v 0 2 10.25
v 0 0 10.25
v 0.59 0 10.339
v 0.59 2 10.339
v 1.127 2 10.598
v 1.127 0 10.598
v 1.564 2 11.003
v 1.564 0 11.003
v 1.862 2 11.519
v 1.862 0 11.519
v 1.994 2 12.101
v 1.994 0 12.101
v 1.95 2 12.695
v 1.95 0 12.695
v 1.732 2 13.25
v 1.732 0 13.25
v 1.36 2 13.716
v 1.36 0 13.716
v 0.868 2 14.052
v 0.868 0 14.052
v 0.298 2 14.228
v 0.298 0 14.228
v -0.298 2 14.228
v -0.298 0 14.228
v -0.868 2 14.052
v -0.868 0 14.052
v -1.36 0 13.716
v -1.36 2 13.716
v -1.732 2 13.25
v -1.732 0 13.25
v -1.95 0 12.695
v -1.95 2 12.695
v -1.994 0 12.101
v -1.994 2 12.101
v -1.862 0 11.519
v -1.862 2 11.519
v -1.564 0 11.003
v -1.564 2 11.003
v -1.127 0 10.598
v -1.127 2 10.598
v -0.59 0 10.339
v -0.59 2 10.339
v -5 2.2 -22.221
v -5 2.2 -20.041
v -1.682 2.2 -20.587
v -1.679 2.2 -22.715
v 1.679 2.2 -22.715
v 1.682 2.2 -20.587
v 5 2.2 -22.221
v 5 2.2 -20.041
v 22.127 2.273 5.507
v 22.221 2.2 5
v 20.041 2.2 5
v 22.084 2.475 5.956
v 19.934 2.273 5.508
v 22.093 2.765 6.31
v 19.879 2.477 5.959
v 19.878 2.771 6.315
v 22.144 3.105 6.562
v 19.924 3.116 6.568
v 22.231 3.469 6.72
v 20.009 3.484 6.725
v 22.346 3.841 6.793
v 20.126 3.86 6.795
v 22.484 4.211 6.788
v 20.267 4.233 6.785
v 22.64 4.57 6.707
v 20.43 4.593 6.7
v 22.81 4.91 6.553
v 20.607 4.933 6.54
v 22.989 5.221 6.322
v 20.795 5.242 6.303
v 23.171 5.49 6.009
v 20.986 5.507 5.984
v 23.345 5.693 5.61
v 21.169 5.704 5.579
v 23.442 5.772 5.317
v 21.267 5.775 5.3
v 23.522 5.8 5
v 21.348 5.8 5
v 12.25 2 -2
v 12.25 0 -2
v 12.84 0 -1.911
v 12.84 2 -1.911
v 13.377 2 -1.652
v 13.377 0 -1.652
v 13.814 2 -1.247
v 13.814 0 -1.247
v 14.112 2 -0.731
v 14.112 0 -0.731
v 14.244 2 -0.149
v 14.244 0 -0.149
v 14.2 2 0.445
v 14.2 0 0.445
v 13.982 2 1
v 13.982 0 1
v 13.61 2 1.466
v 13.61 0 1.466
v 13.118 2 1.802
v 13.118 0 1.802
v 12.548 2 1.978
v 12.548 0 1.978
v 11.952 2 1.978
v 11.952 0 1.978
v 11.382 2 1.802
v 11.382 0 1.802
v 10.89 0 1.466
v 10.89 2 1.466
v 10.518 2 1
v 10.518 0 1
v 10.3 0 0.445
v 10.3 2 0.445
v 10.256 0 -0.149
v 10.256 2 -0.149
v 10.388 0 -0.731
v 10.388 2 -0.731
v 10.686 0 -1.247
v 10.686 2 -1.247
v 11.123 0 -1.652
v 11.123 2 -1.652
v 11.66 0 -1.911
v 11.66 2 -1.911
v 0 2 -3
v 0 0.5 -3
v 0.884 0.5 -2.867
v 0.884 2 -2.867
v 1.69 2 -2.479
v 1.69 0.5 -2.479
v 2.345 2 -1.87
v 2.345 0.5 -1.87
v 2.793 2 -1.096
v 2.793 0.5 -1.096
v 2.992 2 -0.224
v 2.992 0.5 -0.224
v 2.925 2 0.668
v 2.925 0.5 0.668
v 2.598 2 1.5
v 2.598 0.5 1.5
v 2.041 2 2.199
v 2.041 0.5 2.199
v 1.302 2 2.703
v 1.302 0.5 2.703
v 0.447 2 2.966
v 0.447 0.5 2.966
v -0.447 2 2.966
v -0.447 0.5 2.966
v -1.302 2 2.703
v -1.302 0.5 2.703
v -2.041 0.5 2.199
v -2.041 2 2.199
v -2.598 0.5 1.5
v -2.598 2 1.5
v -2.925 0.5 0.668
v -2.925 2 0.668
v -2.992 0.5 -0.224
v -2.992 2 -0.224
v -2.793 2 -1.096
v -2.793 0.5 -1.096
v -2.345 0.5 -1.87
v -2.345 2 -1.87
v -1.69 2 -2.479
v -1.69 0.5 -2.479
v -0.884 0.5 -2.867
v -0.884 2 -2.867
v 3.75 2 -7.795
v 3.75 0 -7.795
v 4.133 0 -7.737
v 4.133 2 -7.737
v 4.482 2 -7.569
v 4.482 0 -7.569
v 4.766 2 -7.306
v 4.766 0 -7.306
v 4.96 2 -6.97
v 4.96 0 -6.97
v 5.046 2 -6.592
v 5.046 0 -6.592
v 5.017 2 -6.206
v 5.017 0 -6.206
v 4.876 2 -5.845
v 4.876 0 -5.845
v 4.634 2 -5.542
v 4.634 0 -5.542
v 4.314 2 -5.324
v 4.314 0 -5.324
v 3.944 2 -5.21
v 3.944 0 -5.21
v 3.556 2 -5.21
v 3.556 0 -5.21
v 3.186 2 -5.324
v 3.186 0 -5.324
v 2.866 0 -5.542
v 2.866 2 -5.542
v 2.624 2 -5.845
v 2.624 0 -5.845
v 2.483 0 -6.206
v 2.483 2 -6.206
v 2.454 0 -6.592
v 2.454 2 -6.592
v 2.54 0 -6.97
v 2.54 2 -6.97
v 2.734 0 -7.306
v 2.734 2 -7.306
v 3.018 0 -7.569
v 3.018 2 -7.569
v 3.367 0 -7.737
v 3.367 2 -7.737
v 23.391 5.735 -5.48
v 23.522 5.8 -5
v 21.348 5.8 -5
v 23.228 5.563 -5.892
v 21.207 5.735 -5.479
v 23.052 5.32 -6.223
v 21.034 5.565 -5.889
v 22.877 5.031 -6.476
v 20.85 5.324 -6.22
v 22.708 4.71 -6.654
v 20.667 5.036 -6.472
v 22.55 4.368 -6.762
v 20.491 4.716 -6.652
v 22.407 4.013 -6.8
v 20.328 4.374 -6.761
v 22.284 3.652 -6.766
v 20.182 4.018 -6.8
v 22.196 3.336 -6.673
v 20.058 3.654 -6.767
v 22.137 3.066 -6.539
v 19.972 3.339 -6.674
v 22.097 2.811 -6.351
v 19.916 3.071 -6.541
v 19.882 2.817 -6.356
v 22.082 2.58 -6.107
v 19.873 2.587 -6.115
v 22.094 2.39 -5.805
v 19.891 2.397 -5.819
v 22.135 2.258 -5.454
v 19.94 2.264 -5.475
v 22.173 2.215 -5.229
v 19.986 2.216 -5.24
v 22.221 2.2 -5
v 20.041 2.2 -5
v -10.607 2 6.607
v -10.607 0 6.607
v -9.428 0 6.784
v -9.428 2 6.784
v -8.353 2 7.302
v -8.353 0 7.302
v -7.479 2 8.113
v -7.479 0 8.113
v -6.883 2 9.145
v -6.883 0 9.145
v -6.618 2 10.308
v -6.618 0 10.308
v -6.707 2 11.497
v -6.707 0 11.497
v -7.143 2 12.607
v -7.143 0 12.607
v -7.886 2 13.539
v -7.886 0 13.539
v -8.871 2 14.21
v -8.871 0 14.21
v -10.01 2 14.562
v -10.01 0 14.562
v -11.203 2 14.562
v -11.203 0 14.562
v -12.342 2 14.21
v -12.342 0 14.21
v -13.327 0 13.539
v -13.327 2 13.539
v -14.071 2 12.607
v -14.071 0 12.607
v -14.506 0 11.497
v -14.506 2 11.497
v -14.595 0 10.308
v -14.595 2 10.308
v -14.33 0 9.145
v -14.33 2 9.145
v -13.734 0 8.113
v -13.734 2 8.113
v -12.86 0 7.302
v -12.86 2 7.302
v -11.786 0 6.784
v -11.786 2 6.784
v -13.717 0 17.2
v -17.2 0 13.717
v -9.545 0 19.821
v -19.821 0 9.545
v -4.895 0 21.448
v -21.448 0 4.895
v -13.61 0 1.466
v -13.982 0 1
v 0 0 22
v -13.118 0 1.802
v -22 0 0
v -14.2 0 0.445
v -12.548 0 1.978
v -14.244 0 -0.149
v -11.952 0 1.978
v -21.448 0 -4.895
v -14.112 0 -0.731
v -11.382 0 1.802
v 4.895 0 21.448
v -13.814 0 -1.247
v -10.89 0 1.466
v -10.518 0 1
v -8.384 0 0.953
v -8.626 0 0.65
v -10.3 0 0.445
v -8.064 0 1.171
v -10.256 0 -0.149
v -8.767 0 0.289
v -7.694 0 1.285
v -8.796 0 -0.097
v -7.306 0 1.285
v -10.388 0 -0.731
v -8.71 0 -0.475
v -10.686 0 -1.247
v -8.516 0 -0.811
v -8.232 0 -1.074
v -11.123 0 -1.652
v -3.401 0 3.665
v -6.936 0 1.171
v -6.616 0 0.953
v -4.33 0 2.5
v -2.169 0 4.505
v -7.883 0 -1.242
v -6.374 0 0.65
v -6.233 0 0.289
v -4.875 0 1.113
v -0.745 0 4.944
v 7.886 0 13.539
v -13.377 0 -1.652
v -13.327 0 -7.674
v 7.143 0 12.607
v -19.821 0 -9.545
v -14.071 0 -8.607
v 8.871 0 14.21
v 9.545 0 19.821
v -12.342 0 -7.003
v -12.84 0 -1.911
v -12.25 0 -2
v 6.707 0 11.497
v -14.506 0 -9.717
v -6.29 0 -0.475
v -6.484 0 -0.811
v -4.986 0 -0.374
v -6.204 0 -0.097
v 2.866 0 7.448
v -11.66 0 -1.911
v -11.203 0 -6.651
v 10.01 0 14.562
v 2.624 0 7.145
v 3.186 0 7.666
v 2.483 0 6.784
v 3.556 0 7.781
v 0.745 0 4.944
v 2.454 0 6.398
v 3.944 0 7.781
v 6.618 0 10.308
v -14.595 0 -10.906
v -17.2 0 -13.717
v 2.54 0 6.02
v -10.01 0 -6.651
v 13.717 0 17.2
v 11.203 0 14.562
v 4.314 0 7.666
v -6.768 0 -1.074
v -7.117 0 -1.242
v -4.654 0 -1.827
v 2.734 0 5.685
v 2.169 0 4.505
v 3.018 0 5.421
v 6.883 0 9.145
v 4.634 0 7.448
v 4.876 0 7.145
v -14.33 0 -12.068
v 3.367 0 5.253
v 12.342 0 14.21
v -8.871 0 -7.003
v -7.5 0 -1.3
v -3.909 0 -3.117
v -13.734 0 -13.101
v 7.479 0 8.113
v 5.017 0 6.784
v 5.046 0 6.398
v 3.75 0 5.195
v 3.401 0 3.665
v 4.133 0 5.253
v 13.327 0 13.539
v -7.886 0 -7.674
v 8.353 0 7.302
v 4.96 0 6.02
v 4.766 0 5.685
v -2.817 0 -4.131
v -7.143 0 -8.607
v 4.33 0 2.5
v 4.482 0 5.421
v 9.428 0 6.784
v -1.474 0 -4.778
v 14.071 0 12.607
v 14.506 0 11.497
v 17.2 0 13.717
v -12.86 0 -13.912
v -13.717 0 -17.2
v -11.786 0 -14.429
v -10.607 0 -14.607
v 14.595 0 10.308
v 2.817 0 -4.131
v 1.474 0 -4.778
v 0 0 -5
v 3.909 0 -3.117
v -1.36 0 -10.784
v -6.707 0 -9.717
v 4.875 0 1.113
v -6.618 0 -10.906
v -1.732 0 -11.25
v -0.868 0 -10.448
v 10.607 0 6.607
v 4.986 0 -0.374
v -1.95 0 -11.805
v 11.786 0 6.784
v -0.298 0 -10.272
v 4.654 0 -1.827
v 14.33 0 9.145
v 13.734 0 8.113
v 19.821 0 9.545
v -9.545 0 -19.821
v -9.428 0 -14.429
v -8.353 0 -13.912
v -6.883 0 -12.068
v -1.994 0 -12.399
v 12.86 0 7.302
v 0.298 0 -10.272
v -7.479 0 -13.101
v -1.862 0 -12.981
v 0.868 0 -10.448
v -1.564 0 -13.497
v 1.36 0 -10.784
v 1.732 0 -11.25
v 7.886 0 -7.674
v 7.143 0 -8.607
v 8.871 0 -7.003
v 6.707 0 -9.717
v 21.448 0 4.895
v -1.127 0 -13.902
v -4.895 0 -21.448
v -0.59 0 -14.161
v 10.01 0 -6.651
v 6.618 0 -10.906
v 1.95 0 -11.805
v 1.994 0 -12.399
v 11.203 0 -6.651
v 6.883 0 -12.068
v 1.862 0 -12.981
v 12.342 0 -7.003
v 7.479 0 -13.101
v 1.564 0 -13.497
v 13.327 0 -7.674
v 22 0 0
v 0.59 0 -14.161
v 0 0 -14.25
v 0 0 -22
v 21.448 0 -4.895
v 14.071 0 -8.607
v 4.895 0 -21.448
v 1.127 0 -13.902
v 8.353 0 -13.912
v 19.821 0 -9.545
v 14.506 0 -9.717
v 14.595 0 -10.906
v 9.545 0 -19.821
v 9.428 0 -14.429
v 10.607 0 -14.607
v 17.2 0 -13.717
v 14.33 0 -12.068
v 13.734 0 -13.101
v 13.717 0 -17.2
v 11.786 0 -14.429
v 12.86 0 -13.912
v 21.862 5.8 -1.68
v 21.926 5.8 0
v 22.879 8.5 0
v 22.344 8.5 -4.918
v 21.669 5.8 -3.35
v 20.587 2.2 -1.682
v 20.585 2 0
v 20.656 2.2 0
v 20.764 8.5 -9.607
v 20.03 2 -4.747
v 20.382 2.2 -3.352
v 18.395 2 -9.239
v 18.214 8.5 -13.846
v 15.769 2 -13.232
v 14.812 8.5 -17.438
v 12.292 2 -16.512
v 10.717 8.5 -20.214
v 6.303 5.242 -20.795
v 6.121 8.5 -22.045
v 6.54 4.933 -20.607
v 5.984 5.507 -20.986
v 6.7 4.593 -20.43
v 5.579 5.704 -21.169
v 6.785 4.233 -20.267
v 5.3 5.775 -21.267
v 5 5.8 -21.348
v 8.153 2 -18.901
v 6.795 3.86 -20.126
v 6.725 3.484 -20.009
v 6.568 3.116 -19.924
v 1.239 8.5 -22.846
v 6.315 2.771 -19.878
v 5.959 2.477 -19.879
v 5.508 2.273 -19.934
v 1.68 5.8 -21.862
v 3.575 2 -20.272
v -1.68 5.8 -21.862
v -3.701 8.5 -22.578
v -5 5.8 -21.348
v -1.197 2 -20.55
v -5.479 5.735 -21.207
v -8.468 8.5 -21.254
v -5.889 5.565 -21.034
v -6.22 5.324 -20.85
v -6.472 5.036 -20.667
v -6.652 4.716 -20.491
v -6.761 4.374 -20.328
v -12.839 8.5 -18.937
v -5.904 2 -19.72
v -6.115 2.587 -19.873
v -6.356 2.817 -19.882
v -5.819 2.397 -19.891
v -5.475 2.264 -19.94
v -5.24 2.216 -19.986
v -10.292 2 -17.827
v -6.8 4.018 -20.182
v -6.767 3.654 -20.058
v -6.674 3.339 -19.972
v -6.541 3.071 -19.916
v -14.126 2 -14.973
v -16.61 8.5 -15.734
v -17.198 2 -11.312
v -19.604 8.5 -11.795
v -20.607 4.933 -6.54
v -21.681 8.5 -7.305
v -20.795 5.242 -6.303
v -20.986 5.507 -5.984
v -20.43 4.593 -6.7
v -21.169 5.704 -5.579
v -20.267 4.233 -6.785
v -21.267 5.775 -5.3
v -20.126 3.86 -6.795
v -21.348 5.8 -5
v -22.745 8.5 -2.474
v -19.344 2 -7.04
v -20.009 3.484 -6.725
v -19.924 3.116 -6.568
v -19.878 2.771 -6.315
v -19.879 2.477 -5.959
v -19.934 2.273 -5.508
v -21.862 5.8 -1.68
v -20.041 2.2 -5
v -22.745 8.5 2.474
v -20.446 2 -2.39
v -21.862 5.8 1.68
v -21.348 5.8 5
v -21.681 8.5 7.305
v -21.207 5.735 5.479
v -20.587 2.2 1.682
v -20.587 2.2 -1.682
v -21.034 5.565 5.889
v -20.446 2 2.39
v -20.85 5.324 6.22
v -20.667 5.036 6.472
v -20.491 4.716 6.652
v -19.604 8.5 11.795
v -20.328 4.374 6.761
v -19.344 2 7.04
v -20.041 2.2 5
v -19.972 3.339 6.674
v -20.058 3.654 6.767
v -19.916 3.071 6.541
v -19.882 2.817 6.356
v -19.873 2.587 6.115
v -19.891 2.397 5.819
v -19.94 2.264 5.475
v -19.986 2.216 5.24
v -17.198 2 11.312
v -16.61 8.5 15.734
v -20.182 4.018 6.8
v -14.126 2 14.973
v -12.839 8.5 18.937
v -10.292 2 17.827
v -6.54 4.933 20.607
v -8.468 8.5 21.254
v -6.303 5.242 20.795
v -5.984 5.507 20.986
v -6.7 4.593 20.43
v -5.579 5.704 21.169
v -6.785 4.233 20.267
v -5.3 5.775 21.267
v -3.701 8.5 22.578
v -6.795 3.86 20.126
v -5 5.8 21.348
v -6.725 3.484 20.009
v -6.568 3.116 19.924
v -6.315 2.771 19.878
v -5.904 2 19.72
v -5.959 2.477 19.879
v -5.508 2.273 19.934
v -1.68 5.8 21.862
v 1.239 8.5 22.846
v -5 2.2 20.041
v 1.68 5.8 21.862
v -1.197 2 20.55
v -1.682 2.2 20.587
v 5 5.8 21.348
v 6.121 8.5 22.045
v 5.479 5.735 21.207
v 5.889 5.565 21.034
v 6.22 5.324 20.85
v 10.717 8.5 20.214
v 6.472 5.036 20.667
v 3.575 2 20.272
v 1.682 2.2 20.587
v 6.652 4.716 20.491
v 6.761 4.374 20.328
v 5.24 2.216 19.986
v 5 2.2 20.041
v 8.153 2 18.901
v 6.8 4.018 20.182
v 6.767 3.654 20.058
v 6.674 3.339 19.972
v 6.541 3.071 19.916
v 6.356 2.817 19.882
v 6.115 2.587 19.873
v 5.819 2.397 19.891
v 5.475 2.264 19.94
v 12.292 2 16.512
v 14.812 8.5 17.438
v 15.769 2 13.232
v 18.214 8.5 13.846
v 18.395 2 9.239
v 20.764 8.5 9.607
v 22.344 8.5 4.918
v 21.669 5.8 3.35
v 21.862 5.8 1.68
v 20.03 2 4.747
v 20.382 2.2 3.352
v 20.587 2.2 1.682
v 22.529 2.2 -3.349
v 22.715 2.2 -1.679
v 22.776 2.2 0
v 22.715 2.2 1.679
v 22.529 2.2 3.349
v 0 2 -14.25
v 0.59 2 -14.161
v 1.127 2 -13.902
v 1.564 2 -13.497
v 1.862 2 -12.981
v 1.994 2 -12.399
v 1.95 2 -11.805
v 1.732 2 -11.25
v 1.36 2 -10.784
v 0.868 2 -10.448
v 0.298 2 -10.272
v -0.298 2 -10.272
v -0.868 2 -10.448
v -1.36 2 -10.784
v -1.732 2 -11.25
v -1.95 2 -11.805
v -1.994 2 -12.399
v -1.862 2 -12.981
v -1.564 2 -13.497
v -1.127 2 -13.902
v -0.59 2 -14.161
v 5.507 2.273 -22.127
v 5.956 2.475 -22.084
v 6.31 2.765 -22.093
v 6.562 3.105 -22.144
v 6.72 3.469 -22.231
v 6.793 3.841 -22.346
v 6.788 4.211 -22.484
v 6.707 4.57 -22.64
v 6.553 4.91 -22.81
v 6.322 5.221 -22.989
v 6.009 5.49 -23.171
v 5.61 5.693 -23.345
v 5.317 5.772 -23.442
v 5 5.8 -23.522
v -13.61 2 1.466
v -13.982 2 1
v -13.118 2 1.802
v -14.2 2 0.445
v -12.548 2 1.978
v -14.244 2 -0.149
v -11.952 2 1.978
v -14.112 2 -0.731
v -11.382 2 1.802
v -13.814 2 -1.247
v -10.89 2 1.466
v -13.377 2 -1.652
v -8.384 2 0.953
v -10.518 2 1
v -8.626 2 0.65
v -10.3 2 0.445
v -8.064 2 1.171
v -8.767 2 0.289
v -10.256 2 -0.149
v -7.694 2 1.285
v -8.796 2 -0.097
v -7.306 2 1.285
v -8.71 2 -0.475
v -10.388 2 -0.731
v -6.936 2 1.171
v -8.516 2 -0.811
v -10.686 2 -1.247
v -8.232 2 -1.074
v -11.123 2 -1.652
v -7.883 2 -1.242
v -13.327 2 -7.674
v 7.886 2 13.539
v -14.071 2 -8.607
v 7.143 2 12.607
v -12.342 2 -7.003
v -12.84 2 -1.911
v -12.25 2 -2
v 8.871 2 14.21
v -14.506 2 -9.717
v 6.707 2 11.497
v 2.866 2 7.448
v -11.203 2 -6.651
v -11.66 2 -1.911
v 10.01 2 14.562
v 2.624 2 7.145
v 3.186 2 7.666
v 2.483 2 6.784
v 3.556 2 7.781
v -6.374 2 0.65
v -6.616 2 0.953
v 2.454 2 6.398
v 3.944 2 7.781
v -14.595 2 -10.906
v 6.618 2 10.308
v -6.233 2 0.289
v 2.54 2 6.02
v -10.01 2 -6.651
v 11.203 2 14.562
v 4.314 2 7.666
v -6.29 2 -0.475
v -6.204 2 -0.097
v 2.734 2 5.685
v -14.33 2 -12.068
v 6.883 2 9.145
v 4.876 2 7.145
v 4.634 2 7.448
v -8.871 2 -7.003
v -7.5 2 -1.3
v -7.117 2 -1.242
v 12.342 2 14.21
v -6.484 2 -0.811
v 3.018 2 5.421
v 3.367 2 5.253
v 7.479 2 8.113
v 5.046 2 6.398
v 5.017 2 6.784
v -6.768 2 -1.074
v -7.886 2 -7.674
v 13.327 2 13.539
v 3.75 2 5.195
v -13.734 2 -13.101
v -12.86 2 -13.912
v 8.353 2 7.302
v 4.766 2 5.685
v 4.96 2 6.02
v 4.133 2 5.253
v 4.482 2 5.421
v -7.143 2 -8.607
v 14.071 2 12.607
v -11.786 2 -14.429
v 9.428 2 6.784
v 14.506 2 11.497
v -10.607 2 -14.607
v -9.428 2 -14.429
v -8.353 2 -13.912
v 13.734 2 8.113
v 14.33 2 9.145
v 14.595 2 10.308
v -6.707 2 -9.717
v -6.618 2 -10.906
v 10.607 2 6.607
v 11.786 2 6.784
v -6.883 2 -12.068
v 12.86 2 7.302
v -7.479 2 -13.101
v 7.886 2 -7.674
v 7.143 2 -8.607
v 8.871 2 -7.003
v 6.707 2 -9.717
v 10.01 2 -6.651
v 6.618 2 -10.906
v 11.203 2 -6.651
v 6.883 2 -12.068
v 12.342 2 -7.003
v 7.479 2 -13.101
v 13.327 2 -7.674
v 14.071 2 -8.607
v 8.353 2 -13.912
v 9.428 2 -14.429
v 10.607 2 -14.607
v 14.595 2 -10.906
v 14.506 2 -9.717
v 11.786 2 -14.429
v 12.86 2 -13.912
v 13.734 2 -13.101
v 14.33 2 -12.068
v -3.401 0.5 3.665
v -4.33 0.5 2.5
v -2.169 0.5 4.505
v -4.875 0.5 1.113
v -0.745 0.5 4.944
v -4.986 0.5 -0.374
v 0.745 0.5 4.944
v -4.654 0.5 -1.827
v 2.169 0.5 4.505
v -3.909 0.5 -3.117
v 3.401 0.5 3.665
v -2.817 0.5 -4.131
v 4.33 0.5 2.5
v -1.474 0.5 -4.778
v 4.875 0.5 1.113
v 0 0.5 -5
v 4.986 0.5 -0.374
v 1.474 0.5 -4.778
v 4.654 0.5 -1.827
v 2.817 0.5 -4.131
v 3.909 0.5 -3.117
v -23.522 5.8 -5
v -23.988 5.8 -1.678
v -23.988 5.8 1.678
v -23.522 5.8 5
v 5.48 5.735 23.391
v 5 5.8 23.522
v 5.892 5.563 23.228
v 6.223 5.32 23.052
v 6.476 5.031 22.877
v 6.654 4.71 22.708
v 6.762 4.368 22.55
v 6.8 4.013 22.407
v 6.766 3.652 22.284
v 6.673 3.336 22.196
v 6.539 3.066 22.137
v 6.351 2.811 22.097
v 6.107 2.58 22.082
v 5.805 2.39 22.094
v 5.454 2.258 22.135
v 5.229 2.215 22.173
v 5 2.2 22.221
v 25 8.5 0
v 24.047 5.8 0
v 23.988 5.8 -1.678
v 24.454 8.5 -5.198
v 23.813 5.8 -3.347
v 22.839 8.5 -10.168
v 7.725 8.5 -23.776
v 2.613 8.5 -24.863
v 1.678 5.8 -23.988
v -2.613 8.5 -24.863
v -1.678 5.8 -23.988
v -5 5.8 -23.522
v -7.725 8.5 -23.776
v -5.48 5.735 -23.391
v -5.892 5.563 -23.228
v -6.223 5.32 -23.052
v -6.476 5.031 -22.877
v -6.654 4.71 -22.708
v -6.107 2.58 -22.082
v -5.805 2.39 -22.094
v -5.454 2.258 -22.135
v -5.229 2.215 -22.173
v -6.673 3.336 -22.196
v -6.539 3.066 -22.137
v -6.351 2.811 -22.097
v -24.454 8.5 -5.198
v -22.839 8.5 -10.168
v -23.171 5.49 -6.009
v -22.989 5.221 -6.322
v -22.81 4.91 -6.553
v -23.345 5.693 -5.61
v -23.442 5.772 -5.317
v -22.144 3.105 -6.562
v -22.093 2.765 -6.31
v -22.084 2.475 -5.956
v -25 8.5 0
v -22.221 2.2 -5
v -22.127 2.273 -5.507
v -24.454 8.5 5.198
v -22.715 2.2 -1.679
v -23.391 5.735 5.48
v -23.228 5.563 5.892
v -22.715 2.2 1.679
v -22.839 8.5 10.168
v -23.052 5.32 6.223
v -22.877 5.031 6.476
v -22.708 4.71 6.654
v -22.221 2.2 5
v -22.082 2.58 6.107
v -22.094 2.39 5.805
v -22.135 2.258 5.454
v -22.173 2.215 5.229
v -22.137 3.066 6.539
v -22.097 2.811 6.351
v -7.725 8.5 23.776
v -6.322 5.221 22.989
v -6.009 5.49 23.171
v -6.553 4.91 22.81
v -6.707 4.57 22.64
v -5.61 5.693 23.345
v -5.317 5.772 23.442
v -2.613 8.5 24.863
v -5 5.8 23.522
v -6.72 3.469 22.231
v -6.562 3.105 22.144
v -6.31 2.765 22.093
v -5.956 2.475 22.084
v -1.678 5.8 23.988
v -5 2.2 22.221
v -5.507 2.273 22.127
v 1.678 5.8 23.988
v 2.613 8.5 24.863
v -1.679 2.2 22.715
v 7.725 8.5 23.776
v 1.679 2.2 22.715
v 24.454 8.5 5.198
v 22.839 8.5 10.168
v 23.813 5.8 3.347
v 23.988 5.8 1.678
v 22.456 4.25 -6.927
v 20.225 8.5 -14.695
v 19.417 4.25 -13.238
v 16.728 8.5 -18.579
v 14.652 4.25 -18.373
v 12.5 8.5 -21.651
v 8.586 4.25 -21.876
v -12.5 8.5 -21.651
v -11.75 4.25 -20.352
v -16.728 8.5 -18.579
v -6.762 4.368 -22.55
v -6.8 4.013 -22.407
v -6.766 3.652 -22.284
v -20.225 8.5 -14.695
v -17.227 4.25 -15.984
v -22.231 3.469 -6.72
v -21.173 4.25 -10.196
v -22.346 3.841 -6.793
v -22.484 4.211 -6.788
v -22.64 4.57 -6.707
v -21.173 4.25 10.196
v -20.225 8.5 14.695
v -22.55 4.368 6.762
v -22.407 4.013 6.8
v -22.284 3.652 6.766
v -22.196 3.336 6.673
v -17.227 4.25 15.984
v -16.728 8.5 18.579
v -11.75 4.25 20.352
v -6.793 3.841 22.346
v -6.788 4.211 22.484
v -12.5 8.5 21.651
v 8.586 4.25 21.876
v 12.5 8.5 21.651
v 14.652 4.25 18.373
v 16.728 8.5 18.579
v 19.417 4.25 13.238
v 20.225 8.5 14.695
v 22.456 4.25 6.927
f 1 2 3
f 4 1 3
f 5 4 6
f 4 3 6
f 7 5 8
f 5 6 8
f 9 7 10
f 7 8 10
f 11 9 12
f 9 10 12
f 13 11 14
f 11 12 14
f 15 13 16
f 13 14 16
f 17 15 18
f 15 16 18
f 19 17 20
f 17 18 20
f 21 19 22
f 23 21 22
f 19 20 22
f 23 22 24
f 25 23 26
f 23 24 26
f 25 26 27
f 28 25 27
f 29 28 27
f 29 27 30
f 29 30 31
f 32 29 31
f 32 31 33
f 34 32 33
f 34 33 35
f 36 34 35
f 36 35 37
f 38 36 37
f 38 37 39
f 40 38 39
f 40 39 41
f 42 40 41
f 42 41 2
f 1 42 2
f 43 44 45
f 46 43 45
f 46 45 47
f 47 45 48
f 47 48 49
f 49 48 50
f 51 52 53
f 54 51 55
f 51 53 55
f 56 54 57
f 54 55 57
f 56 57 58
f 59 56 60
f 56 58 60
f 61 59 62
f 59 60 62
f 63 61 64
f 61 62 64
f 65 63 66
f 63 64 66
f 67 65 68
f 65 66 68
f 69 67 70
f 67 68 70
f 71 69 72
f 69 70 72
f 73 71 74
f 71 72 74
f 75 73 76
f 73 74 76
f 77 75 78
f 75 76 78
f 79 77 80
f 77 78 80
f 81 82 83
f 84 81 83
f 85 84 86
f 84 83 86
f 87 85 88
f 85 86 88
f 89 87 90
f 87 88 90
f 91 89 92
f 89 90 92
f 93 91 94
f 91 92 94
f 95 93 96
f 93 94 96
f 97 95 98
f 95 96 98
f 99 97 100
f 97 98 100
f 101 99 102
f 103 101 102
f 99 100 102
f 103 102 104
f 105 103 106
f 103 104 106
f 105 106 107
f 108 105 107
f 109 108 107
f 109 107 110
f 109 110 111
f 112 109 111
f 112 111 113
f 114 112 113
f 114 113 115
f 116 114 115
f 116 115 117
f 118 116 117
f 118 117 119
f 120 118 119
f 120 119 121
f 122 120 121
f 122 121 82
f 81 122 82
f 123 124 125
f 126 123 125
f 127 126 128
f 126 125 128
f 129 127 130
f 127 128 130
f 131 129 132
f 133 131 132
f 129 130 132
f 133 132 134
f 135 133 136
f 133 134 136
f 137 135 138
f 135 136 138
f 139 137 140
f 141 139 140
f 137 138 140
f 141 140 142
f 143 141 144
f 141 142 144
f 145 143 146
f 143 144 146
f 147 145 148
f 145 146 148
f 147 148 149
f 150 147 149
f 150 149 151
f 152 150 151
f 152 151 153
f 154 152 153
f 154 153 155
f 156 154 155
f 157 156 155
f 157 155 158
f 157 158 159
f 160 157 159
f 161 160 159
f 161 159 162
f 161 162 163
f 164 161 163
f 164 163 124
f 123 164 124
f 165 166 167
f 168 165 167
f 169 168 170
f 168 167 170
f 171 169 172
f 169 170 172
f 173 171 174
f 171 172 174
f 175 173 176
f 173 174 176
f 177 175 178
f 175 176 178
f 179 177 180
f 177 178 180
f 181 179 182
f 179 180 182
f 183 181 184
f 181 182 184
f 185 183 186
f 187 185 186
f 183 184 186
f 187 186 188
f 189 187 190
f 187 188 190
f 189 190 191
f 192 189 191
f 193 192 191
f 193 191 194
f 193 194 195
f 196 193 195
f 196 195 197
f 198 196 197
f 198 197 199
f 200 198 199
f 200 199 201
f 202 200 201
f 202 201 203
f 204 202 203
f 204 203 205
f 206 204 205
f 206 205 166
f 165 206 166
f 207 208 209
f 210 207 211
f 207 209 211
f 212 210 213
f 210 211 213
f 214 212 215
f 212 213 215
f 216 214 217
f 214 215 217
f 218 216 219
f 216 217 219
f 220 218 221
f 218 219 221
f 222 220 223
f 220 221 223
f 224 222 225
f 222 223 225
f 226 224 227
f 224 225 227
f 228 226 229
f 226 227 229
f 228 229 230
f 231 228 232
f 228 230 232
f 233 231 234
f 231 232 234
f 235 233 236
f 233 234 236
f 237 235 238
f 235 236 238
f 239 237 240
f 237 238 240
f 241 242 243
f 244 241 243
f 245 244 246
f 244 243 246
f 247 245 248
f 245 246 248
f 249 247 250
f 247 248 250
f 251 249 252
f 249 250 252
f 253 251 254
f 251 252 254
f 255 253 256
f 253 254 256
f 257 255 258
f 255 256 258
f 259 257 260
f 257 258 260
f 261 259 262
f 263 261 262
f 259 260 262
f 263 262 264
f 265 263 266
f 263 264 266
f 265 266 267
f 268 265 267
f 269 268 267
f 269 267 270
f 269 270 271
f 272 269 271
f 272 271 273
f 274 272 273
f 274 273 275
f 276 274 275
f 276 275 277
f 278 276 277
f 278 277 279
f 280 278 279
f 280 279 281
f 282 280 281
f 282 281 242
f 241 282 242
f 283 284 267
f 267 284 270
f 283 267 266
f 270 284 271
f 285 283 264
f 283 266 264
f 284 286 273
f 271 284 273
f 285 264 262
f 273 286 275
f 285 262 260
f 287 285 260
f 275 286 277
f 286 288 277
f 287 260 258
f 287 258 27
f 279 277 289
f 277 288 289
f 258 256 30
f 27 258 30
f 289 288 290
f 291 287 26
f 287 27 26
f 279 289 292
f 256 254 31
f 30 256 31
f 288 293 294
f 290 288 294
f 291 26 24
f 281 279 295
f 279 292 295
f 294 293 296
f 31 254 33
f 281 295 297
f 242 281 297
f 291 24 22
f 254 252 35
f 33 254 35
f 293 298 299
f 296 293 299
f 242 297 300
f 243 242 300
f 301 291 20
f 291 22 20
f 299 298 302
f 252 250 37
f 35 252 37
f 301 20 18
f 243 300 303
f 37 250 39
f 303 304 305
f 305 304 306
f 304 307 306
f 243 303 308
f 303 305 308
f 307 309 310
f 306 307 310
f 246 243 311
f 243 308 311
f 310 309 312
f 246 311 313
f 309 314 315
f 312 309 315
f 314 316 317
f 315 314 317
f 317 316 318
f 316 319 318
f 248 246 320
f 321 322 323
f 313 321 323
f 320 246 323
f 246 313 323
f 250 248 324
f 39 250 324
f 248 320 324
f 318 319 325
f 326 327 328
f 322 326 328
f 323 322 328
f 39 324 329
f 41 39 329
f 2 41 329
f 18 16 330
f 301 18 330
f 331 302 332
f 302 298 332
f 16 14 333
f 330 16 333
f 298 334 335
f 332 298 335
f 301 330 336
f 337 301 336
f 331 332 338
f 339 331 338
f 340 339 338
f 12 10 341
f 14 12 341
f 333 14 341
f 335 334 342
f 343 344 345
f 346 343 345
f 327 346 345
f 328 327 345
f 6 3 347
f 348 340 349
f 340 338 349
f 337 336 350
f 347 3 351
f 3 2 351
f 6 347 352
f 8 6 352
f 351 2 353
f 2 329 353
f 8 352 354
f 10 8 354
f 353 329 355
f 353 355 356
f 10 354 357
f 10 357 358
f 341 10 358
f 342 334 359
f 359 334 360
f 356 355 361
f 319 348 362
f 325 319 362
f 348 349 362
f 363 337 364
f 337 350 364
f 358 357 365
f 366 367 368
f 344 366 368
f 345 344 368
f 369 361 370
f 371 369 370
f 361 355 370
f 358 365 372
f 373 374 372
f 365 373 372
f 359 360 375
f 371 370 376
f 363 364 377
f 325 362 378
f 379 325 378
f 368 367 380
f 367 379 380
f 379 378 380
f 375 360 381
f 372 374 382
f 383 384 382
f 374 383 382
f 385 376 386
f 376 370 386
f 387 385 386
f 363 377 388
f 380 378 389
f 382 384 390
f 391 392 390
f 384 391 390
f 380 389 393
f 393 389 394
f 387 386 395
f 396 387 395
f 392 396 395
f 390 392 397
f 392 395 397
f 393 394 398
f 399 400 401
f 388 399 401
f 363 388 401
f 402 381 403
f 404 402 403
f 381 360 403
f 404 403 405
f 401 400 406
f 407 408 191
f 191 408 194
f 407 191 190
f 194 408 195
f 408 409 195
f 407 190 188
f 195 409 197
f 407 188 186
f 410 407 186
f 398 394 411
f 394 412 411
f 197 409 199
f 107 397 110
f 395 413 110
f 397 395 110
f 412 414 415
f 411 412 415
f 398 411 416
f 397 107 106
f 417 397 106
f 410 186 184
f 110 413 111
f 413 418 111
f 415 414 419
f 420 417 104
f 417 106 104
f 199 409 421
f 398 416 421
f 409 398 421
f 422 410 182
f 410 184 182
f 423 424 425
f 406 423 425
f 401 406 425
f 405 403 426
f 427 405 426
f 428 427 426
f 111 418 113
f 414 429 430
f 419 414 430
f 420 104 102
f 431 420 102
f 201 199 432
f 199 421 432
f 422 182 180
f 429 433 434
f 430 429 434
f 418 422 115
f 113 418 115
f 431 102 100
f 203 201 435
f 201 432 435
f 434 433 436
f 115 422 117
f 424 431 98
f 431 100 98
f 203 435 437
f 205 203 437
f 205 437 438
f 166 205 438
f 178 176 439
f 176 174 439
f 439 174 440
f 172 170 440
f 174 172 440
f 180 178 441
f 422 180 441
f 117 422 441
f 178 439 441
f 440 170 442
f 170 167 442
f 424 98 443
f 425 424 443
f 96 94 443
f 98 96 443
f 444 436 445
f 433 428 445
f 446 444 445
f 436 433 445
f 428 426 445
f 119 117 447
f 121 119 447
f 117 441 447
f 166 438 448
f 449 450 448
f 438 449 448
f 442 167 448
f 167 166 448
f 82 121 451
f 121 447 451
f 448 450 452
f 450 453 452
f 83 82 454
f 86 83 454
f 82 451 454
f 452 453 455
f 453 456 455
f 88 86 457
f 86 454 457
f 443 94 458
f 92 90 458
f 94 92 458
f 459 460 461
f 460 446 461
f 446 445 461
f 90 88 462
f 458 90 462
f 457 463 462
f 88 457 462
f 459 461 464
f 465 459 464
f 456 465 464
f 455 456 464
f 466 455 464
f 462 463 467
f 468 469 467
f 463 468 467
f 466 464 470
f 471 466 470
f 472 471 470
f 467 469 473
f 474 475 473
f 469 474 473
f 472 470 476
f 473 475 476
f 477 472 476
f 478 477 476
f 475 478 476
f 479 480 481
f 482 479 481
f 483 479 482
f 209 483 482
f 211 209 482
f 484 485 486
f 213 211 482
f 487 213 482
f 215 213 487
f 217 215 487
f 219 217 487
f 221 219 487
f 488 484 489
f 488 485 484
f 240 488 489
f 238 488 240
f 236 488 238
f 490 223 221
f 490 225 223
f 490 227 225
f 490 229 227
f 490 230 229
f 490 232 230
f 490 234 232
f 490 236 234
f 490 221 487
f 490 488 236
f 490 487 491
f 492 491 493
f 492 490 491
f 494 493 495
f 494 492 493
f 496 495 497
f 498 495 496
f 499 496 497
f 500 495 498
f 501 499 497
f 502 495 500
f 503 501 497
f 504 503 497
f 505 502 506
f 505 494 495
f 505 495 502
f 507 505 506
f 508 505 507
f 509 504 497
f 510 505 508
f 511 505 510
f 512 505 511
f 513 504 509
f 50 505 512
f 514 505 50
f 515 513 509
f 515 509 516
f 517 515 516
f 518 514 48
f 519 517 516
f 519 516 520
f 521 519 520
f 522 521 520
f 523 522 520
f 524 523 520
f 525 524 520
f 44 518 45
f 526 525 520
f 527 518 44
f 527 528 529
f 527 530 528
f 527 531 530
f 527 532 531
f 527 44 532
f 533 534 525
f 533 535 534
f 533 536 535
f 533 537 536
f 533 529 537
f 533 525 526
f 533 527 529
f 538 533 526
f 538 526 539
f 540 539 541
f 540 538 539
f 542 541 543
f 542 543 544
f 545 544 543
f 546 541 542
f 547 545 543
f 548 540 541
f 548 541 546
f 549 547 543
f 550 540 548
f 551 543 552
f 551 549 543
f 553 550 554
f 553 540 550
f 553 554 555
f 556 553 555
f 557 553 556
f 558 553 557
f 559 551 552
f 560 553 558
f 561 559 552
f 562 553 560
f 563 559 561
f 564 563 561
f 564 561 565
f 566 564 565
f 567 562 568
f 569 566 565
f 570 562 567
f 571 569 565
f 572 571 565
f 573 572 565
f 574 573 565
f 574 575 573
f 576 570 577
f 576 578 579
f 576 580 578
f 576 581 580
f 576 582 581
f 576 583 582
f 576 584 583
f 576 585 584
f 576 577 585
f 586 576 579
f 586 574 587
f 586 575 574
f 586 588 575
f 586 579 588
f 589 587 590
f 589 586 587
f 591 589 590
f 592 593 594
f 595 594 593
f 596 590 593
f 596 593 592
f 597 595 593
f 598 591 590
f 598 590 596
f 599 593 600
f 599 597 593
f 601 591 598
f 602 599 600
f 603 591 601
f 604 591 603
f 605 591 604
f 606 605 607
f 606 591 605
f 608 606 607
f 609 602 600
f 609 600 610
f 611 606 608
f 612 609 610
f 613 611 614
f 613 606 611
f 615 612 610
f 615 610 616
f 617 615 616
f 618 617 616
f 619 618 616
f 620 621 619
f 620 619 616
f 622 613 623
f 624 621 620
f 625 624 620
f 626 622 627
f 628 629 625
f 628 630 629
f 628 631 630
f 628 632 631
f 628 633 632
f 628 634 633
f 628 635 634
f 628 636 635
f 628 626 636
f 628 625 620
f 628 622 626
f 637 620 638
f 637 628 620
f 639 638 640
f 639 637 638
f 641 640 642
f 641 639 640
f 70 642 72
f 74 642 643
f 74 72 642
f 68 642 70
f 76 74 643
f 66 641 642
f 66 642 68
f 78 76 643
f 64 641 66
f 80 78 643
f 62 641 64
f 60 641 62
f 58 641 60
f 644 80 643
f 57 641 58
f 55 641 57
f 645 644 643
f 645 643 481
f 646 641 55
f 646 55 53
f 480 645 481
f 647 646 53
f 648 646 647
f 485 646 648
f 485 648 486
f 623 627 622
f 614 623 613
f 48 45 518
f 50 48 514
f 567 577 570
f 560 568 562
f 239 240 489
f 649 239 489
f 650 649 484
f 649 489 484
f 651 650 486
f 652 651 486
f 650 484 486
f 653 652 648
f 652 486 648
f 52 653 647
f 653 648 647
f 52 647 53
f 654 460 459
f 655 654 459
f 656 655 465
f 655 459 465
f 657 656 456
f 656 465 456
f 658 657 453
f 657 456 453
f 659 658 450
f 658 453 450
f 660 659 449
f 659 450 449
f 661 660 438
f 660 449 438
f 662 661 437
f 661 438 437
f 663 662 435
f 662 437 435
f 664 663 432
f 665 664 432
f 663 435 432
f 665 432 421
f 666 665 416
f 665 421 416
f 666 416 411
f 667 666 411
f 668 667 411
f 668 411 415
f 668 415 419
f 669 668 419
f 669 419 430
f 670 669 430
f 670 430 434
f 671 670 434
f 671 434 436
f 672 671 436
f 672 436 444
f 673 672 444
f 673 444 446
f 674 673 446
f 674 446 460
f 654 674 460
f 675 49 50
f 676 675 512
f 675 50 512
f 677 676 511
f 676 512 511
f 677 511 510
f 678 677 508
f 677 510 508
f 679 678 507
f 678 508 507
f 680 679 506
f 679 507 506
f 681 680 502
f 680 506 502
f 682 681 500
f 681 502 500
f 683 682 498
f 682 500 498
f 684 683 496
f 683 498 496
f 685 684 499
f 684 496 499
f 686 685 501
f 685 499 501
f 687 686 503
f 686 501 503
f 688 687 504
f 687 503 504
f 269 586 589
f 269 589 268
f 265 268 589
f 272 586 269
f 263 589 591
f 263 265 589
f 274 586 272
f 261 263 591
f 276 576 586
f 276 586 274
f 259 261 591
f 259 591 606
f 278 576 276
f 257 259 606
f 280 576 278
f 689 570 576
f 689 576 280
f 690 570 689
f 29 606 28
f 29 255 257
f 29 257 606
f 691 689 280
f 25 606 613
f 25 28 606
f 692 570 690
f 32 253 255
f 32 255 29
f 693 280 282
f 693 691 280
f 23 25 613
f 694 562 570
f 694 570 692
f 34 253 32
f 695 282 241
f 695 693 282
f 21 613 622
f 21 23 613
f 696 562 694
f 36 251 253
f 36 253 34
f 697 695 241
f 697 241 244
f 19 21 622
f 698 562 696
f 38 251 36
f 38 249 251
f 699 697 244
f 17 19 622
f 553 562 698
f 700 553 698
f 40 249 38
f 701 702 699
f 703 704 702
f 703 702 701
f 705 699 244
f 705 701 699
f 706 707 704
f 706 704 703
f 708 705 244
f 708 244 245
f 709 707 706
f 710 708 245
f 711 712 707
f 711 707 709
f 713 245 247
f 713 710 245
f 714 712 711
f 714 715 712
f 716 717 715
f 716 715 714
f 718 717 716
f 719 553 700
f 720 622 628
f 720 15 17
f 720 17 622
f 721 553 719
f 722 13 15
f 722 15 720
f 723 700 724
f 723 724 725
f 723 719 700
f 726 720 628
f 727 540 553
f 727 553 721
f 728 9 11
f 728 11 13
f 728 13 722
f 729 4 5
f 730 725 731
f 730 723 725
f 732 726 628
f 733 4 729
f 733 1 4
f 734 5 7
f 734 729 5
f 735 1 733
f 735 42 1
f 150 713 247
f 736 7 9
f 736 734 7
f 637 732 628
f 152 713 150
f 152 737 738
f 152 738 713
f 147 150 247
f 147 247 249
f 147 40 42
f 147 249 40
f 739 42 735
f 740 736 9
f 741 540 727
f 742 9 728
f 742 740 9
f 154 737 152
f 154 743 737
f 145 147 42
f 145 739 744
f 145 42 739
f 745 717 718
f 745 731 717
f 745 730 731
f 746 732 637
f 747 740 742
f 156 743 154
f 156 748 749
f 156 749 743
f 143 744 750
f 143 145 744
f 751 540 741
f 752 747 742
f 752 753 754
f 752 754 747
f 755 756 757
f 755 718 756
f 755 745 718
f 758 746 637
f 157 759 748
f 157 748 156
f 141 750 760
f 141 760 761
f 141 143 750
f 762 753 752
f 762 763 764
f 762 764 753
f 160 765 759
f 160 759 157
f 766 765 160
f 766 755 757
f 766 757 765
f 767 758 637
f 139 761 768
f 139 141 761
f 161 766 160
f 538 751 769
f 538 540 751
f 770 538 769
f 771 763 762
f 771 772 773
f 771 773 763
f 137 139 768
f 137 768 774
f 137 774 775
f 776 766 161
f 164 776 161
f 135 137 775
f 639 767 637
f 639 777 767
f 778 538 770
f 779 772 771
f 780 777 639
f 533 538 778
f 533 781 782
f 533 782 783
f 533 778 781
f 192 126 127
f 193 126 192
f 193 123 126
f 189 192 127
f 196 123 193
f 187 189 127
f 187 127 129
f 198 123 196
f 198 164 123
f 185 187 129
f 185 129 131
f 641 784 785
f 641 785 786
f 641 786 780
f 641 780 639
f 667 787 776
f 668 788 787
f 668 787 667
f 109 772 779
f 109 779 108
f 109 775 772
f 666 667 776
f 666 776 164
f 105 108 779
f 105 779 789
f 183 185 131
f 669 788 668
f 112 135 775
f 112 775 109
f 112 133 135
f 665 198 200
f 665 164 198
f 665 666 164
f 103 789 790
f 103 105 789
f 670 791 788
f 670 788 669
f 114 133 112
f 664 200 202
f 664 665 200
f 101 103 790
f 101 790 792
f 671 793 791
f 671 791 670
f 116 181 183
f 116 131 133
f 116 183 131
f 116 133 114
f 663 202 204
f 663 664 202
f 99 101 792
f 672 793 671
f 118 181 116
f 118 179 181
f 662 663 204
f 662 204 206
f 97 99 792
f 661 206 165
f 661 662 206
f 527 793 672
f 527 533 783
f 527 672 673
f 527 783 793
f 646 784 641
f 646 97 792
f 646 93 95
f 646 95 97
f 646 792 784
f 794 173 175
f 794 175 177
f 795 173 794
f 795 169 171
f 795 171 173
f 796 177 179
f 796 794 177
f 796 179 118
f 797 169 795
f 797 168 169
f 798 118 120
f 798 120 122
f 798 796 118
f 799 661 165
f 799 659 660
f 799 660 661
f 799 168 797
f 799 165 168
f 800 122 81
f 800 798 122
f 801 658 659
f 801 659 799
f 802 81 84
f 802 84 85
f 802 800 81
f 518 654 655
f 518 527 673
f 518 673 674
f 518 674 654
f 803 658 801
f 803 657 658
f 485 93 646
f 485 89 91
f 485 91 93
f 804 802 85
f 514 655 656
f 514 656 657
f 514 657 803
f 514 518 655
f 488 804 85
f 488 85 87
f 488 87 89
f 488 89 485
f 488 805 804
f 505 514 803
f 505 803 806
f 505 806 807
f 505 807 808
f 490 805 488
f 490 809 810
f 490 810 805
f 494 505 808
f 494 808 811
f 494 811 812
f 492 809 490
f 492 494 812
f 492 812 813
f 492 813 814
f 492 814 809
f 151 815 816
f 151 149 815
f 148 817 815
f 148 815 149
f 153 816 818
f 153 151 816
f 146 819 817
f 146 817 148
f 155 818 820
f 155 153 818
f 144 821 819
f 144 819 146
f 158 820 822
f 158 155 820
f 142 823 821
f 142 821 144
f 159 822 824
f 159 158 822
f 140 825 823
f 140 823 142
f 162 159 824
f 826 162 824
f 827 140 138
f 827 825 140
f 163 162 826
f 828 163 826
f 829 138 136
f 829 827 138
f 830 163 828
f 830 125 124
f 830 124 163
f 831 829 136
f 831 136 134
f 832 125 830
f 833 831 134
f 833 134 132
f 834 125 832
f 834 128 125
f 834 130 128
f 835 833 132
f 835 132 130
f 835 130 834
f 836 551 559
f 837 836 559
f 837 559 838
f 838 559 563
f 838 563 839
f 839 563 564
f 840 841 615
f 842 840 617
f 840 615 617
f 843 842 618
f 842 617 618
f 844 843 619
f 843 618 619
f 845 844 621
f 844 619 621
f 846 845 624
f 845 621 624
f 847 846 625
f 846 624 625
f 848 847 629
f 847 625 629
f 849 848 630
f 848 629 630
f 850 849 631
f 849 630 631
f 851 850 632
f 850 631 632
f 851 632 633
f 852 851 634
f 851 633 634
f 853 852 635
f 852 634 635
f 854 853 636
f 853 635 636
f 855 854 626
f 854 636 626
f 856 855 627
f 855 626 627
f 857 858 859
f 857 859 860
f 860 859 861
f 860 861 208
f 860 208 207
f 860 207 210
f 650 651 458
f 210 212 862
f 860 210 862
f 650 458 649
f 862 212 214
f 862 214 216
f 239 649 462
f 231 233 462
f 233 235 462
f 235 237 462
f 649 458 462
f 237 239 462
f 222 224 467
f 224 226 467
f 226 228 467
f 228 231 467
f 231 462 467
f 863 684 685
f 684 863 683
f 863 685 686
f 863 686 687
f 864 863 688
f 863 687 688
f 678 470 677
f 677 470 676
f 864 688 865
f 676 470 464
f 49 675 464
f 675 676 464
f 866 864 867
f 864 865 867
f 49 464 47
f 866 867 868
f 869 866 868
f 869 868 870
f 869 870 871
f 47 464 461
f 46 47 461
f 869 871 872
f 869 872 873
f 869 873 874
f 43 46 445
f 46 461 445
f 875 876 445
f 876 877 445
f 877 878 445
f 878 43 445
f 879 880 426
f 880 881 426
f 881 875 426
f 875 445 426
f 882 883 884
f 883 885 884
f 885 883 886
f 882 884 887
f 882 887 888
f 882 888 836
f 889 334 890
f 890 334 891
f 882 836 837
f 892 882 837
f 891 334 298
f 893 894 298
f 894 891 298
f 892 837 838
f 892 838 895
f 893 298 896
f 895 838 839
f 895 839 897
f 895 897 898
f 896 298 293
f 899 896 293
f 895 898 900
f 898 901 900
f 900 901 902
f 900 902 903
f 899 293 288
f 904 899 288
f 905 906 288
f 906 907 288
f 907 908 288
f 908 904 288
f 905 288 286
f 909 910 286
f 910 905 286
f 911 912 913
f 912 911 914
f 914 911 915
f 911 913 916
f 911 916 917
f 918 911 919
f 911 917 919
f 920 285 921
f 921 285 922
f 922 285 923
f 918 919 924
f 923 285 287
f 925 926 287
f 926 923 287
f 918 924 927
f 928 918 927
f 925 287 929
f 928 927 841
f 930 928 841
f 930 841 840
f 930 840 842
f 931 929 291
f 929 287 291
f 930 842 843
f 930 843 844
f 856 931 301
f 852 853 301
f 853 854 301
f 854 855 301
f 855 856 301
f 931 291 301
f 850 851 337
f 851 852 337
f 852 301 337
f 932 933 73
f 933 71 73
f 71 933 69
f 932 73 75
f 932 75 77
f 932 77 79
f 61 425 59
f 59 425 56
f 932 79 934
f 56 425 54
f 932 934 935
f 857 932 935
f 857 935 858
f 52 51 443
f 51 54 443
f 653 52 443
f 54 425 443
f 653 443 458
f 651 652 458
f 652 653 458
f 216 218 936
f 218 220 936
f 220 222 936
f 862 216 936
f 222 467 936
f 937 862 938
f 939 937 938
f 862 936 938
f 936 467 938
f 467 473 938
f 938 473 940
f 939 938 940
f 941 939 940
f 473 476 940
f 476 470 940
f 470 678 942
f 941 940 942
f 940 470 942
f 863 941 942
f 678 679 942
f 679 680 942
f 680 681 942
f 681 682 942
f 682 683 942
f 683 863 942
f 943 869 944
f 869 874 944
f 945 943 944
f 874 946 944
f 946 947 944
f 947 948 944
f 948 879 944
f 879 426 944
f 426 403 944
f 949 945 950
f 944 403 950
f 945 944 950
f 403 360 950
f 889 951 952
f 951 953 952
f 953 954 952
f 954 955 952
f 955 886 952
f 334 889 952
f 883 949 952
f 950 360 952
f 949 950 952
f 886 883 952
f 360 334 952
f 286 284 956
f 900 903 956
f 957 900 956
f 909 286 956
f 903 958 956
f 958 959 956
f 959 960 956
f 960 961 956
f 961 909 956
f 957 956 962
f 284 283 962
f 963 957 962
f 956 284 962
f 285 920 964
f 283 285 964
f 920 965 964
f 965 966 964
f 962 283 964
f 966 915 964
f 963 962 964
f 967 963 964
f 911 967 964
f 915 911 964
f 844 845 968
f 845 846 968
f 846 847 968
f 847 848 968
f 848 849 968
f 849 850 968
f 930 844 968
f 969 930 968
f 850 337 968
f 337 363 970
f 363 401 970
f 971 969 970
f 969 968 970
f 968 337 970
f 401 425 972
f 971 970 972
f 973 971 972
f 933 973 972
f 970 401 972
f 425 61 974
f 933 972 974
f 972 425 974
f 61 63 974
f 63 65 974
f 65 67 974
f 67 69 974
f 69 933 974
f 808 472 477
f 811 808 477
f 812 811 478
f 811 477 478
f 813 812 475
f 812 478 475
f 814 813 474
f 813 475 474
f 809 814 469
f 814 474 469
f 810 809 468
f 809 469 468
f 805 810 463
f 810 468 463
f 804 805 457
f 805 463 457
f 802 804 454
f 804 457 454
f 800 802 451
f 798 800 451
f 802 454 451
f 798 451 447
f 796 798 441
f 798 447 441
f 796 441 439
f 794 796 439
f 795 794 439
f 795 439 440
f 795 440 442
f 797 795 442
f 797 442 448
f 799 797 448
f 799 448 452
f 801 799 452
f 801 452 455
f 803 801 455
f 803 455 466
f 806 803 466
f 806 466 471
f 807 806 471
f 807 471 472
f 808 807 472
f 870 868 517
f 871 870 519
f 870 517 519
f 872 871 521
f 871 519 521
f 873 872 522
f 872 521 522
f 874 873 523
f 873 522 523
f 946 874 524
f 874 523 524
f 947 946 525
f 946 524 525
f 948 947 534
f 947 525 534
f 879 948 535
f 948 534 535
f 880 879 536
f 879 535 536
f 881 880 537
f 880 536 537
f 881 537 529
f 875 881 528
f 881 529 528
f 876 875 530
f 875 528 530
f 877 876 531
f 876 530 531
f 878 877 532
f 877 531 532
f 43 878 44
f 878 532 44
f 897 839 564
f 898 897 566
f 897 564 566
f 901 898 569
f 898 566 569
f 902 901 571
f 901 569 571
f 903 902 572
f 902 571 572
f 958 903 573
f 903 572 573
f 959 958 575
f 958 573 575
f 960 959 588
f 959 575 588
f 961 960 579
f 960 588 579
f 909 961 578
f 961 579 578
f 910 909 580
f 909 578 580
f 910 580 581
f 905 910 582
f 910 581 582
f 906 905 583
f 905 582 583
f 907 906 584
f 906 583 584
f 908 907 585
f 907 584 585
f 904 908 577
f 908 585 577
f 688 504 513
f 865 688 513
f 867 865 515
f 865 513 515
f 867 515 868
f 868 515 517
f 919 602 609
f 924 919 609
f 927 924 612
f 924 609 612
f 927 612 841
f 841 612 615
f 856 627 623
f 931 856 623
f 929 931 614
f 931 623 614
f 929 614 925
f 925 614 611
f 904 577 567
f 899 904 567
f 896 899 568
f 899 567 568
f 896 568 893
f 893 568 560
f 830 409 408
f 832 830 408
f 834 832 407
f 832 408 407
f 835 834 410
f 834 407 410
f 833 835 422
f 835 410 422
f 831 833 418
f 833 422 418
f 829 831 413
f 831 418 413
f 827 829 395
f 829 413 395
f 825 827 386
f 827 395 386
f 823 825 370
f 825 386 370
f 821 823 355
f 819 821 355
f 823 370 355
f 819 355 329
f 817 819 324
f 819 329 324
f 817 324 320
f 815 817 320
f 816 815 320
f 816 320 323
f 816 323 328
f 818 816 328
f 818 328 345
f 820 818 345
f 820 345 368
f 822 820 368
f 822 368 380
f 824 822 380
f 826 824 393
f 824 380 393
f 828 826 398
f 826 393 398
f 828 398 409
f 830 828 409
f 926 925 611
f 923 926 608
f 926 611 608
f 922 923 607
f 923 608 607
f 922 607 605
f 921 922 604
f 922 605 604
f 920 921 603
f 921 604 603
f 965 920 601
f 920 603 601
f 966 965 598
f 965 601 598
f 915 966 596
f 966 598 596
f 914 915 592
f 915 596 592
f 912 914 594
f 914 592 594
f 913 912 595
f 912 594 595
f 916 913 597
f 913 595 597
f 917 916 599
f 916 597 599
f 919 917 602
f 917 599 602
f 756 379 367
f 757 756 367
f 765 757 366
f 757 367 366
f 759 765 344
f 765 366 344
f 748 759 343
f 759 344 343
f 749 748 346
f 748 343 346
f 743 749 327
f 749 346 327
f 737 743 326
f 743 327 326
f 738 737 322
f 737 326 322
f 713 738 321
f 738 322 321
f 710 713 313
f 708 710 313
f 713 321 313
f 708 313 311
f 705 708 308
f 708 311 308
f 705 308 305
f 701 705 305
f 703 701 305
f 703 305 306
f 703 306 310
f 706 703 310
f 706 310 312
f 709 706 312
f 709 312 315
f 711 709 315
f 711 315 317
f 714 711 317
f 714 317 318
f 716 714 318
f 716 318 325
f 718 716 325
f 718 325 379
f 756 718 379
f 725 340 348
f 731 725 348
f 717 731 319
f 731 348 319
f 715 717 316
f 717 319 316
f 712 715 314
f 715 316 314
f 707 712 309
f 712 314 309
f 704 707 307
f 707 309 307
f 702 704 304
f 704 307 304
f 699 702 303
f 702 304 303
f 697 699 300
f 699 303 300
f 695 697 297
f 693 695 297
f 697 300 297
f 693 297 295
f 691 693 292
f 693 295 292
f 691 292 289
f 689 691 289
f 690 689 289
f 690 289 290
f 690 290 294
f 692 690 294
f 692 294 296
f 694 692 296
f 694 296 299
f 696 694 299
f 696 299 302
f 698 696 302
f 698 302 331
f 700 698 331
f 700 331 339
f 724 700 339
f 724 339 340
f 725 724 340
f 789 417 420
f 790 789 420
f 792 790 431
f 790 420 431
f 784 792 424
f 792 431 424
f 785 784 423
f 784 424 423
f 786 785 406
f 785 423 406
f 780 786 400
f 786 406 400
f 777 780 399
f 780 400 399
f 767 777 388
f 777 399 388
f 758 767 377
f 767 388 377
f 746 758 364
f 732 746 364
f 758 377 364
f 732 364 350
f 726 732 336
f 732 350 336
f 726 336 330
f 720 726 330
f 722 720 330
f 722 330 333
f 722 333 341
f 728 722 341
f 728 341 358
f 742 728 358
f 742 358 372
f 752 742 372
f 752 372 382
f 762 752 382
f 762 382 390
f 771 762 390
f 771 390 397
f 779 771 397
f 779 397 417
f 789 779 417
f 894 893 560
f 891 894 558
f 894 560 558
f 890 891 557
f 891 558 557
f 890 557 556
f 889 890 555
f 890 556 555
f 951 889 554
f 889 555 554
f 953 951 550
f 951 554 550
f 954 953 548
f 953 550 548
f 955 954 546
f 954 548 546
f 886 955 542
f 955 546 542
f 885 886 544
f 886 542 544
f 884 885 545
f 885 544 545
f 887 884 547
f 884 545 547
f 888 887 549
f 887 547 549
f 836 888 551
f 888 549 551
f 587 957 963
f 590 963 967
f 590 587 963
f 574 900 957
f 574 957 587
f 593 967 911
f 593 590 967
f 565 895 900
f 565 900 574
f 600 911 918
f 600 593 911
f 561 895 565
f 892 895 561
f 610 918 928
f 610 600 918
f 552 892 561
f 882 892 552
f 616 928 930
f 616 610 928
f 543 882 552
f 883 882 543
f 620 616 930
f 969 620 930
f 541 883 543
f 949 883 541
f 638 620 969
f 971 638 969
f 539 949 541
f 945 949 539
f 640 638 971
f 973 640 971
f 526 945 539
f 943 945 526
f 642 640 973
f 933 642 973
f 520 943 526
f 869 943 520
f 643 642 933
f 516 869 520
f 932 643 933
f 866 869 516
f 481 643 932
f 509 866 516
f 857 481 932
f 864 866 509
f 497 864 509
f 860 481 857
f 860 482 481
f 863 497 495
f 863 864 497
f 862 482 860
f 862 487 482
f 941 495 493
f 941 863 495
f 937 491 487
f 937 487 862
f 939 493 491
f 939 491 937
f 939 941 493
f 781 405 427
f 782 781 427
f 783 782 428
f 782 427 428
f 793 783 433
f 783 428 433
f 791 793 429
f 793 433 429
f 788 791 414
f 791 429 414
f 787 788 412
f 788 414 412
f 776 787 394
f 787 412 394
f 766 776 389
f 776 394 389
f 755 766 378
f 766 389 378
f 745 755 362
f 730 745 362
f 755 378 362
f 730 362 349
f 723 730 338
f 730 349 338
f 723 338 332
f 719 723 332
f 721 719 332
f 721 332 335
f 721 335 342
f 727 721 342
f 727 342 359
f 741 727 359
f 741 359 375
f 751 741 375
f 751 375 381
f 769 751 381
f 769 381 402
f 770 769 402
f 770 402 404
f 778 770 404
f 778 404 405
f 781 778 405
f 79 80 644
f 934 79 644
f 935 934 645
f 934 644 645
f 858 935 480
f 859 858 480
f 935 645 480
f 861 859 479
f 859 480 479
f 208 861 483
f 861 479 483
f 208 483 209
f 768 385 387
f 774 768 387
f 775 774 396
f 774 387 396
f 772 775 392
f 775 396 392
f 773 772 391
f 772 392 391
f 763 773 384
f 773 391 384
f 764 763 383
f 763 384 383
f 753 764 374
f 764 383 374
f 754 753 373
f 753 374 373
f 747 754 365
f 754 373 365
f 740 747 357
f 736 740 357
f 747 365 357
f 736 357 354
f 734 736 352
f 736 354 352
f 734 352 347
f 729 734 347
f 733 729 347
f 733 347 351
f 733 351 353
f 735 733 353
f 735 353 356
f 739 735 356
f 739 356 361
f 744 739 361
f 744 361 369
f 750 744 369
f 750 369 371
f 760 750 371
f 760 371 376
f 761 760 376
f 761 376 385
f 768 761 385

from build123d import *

# Parameters (mm, degrees)
SKETCH2_R          = 25
SKETCH1_R          = 22
SHELL1_T           = -2
SKETCH3_R          = 3
SKETCH3_R_2        = 2
SKETCH3_R_3        = 4
SKETCH3_R_4        = 1.3
CUT_EXTRUDE1_DEPTH = 37.362755832
CUT_EXTRUDE2_DEPTH = 31
CIRPATTERN1_COUNT  = 4
SKETCH5_R          = 5
CUT_EXTRUDE3_DEPTH = 0.5


with BuildPart() as part:
    # Sketch2 → Loft1 section 0
    with BuildSketch(Plane(origin=(0, 8.5, 0), x_dir=(1, 0, 0), z_dir=(0, 1, 0))):
        Circle(SKETCH2_R)
    # Sketch1 → Loft1 section 1
    with BuildSketch(Plane(origin=(0, 0, 0), x_dir=(1, 0, 0), z_dir=(0, 1, 0))):
        Circle(SKETCH1_R)
    loft()

    # Shell1
    shell1_openings = [part.faces().sort_by_distance(p)[0] for p in [
        (0, 8.5, 0),
    ]]
    offset(amount=SHELL1_T, openings=shell1_openings, kind=Kind.INTERSECTION)

    # Sketch3 → Cut-Extrude1 (cut, through all)
    with BuildSketch(Plane.XZ):
        with Locations(Location((0, 0, 0), (0, 0, 270))):
            Circle(SKETCH3_R)
        with Locations(Location((0, -12.25, 0), (0, 0, 270))):
            Circle(SKETCH3_R_2)
        with Locations(Location((-12.25, 0, 0), (0, 0, 270))):
            Circle(SKETCH3_R_2)
        with Locations(Location((0, 12.25, 0), (0, 0, 270))):
            Circle(SKETCH3_R_2)
        with Locations(Location((12.25, 0, 0), (0, 0, 270))):
            Circle(SKETCH3_R_2)
        with Locations(Location((-10.606601718, -10.606601718, 0), (0, 0, 270))):
            Circle(SKETCH3_R_3)
        with Locations(Location((-10.606601718, 10.606601718, 0), (0, 0, 270))):
            Circle(SKETCH3_R_3)
        with Locations(Location((10.606601718, 10.606601718, 0), (0, 0, 270))):
            Circle(SKETCH3_R_3)
        with Locations(Location((10.606601718, -10.606601718, 0), (0, 0, 270))):
            Circle(SKETCH3_R_3)
        with Locations(Location((-7.5, 0, 0), (0, 0, 270))):
            Circle(SKETCH3_R_4)
        with Locations(Location((3.75, 6.495190528, 0), (0, 0, 270))):
            Circle(SKETCH3_R_4)
        with Locations(Location((3.75, -6.495190528, 0), (0, 0, 270))):
            Circle(SKETCH3_R_4)
    extrude(amount=-CUT_EXTRUDE1_DEPTH, mode=Mode.SUBTRACT)

    # Sketch4 → Cut-Extrude2 (cut)
    with BuildSketch(Plane.XY):
        with BuildLine():
            Line((5, 2.2), (-5, 2.2))
            ThreePointArc((-5, 2.2), (-6.8, 4), (-5, 5.8))
            Line((-5, 5.8), (5, 5.8))
            ThreePointArc((5, 5.8), (6.8, 4), (5, 2.2))
        make_face()
    cut_extrude2 = extrude(amount=CUT_EXTRUDE2_DEPTH, mode=Mode.SUBTRACT)

    # CirPattern1: Cut-Extrude2 ×4 about axis
    cirpattern1_axis = Axis((0, 0, 0), (0, 1, 0))
    for i in range(1, CIRPATTERN1_COUNT):
        add(cut_extrude2.rotate(cirpattern1_axis, i * 360 / CIRPATTERN1_COUNT), mode=Mode.SUBTRACT)

    # Sketch5 → Cut-Extrude3 (cut)
    with BuildSketch(Plane.XZ):
        with Locations(Location((0, 0, 0), (0, 0, 270))):
            Circle(SKETCH5_R)
    extrude(amount=-CUT_EXTRUDE3_DEPTH, mode=Mode.SUBTRACT)


solid = part.part
